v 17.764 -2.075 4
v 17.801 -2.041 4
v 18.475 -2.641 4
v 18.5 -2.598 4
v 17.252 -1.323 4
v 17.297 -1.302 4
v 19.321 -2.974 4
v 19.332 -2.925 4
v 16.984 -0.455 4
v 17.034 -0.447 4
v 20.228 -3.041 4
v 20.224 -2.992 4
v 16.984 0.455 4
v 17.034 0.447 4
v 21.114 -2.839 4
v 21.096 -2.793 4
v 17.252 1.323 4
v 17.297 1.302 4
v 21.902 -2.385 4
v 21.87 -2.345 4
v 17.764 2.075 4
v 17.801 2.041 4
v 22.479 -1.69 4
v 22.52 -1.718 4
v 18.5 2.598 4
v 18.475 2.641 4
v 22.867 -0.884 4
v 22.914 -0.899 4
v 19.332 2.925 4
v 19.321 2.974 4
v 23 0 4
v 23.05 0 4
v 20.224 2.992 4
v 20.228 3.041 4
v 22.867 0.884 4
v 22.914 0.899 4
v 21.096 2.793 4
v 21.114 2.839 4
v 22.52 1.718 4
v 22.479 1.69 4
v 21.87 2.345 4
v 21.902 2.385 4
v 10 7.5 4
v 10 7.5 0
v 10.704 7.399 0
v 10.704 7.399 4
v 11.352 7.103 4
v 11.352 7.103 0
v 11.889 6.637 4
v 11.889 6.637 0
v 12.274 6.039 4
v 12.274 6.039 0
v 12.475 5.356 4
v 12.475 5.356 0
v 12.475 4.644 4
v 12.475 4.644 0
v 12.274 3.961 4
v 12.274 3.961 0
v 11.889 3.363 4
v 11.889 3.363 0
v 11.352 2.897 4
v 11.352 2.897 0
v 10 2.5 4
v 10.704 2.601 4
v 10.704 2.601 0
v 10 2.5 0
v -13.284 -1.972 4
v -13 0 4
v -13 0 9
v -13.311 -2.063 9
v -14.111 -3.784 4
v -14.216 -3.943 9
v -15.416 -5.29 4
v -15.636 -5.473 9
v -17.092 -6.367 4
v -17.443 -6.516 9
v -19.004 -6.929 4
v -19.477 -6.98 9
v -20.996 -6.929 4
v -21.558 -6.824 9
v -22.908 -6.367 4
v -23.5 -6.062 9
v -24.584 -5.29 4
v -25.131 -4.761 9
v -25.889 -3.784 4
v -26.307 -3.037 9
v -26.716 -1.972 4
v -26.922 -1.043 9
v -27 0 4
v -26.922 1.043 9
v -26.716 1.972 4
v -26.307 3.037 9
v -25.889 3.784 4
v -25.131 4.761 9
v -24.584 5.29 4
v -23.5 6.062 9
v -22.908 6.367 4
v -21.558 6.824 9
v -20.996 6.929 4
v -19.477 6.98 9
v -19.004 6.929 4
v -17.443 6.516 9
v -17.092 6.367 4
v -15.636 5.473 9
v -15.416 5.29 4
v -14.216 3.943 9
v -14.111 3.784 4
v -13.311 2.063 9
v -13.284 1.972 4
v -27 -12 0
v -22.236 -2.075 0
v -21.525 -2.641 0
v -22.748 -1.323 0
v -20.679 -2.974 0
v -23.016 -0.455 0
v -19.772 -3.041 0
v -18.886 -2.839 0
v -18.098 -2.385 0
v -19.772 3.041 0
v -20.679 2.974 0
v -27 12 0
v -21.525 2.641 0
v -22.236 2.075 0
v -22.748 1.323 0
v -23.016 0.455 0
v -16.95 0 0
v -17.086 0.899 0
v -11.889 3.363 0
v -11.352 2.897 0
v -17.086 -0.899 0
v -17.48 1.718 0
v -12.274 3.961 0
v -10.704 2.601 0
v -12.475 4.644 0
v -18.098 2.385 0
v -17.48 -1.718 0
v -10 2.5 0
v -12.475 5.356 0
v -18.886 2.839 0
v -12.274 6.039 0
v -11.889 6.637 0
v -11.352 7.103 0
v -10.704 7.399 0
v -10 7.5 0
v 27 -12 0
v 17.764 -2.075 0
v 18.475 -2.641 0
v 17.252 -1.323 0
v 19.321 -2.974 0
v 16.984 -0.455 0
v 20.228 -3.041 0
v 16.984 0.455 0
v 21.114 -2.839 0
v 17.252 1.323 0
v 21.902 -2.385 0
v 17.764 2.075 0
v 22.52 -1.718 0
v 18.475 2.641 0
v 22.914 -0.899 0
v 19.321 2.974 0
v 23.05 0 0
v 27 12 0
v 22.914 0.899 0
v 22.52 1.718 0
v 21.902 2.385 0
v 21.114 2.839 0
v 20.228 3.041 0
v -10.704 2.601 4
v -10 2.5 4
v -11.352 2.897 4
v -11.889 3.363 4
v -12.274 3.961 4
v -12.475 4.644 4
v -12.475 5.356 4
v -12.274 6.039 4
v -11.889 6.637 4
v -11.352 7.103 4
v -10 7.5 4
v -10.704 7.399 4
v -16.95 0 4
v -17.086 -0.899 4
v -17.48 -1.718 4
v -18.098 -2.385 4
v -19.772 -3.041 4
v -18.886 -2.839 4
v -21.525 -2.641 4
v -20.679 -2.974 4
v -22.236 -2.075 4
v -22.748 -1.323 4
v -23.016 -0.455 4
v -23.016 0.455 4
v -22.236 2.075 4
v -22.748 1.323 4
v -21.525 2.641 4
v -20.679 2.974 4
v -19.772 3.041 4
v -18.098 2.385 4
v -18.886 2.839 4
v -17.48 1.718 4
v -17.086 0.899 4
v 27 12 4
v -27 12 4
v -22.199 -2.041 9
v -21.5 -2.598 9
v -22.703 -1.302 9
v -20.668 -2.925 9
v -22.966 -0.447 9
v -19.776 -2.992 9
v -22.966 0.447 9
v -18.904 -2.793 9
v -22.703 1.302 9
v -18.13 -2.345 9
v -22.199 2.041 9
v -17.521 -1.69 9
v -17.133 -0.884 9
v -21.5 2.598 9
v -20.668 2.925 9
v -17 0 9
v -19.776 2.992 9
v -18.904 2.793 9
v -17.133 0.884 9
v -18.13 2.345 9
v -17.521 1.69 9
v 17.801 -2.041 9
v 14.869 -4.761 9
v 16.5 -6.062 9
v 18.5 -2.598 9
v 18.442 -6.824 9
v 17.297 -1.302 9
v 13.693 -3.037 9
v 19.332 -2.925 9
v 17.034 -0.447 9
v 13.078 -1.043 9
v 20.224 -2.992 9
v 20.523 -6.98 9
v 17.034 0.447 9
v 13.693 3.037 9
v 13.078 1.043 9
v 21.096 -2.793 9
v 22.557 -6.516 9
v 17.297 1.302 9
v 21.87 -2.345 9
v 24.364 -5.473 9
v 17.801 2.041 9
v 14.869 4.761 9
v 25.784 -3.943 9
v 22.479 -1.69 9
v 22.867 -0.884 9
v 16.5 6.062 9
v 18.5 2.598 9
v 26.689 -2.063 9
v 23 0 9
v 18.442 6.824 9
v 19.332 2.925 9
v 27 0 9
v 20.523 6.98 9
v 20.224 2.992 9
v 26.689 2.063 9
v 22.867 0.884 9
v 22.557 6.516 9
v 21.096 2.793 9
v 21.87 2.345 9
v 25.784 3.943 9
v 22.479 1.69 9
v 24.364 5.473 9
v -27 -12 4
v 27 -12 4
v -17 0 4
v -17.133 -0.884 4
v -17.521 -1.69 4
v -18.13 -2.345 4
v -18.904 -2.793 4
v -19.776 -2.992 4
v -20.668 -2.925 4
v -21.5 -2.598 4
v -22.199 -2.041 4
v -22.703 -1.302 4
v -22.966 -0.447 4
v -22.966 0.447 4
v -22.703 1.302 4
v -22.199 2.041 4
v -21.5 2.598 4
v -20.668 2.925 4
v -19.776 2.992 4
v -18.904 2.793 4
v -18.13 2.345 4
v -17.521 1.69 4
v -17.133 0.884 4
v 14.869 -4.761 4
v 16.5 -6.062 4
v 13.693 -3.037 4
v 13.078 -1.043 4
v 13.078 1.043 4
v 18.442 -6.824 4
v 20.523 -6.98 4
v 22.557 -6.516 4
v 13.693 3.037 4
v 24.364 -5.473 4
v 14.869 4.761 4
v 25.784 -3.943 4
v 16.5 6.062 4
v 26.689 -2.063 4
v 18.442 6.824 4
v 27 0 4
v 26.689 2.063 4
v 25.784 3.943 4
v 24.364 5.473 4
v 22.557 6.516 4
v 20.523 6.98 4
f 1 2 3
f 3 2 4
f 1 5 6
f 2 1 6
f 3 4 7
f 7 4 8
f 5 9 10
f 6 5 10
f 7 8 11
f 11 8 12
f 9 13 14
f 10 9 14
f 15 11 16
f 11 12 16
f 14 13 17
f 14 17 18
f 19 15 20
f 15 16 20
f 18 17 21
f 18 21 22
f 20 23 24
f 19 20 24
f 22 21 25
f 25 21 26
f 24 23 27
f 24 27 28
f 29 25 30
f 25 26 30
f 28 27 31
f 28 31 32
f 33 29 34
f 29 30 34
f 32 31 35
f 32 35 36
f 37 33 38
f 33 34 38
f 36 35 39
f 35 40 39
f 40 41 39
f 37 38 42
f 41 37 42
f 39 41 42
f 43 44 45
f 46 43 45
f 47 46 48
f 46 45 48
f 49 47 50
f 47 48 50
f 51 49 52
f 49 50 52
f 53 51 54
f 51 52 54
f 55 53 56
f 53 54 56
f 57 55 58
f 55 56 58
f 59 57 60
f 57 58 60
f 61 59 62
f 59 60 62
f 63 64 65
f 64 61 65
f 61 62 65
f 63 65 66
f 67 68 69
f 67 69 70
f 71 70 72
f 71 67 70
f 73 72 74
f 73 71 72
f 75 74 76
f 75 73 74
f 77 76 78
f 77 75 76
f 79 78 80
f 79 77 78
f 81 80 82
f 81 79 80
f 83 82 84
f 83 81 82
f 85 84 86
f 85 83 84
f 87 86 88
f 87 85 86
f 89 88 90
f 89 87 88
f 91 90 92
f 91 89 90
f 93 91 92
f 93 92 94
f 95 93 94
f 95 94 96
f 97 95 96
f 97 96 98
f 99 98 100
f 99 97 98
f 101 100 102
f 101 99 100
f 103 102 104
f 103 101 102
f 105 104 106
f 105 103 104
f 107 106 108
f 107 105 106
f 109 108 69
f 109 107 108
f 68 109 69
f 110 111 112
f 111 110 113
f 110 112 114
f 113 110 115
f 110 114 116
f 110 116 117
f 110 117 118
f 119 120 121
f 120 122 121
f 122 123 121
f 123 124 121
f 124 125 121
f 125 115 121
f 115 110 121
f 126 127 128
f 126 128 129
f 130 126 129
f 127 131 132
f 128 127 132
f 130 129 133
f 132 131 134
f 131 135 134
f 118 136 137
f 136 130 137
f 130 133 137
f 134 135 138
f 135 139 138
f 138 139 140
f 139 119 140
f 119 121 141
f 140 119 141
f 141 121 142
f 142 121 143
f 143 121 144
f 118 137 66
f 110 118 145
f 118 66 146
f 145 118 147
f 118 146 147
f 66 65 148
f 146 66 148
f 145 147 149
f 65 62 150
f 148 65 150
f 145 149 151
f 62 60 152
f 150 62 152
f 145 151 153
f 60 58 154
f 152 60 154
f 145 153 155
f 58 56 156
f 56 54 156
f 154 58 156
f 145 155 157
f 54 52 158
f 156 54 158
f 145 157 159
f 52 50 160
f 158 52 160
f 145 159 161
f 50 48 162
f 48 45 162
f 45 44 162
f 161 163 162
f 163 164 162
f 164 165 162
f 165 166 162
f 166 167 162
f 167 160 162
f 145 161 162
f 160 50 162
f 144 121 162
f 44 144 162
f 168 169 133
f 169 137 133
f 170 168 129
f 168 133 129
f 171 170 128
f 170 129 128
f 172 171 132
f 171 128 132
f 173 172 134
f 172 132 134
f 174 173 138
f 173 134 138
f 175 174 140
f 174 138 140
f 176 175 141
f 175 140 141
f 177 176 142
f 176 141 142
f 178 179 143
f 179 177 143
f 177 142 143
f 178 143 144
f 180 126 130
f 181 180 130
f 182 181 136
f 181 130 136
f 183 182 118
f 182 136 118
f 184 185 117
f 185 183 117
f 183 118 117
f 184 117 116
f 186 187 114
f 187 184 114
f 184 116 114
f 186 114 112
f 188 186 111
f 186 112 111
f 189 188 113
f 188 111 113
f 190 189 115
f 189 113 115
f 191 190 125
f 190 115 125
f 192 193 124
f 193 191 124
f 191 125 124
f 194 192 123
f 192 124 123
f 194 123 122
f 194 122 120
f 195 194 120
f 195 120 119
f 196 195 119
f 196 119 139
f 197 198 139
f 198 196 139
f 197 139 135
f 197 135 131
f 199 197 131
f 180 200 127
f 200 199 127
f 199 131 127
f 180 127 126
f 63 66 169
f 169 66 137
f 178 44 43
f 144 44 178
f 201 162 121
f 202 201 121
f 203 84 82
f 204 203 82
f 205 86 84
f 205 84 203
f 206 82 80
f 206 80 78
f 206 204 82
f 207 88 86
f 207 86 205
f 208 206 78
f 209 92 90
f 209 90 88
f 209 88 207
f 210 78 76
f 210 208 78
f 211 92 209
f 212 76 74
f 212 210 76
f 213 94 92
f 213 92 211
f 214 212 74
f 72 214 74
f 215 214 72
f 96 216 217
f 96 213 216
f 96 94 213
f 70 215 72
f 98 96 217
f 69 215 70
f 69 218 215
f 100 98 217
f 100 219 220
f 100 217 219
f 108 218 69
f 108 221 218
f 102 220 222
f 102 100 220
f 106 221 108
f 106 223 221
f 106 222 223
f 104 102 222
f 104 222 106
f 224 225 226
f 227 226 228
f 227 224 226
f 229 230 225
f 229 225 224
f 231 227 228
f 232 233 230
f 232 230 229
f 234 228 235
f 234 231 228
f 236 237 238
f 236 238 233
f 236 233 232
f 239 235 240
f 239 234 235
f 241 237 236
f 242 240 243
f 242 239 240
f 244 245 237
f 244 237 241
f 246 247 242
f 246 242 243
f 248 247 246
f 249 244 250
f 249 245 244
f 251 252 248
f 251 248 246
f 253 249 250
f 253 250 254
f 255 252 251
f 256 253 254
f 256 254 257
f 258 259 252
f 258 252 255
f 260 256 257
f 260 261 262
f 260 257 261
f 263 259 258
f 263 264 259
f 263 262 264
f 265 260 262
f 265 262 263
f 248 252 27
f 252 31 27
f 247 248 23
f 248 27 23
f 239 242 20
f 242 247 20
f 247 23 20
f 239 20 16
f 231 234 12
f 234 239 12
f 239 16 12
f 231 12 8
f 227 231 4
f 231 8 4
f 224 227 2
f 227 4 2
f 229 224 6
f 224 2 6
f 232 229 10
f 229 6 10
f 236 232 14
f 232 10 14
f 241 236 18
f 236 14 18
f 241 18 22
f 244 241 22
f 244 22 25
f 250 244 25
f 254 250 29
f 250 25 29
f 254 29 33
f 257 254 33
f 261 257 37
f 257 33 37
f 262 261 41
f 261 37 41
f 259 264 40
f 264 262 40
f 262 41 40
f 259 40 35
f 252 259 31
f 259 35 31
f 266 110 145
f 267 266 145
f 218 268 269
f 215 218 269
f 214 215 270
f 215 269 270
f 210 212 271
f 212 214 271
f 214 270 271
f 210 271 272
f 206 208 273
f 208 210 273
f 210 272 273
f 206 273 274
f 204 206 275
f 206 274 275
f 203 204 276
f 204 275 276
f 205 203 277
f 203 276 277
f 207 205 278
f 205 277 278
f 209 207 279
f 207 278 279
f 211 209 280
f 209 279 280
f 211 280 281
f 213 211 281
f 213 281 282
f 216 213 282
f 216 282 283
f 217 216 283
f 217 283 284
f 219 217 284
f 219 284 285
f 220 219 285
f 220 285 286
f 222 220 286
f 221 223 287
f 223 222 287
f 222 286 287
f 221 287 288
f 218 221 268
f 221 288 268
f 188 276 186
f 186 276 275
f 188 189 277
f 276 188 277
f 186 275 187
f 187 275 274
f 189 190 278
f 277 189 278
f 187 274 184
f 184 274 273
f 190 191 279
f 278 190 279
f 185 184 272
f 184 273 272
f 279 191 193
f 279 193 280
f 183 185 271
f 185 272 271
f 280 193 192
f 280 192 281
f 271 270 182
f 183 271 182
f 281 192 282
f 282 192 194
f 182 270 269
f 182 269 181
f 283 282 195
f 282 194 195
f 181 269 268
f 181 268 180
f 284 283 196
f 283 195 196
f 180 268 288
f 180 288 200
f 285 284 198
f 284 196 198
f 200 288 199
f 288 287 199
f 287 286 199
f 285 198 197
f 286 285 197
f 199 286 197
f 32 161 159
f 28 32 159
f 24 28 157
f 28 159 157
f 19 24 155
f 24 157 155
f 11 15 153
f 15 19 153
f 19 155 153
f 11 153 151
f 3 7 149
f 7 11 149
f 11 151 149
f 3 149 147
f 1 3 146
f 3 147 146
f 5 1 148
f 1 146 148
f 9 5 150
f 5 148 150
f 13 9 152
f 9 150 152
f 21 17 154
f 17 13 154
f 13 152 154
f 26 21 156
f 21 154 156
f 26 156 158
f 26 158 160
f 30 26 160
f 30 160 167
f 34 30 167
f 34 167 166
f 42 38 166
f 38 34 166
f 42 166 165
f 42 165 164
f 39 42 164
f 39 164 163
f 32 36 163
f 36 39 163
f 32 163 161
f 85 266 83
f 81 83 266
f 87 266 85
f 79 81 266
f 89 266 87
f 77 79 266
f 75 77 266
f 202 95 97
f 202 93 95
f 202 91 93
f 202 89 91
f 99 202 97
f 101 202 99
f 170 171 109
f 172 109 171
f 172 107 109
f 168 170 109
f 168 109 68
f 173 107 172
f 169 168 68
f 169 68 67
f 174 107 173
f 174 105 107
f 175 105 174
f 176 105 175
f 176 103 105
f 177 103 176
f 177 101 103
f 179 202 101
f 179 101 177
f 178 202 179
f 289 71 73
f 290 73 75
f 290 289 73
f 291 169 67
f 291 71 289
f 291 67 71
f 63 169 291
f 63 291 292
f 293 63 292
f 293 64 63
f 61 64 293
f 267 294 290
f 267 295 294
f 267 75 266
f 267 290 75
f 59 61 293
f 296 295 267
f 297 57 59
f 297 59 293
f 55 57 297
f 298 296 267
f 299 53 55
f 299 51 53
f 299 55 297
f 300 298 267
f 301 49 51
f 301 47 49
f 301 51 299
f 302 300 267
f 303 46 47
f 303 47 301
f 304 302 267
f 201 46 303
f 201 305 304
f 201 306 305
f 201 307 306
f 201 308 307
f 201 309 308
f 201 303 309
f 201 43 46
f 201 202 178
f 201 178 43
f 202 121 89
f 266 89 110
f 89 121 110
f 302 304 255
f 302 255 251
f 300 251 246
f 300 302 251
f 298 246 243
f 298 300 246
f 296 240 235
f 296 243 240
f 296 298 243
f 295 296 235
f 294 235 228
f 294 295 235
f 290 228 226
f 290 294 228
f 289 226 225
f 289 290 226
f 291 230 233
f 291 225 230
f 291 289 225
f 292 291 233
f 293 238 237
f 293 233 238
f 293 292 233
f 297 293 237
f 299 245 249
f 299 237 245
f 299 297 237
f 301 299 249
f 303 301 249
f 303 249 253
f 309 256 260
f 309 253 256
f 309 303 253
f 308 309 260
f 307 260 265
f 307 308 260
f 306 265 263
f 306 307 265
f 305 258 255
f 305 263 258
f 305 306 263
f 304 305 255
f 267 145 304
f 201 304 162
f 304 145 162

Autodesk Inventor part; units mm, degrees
ref_plane "YZ Plane" through (0, 0, 0) normal (1, 0, 0) x (0, 1, 0)
ref_plane "XZ Plane" through (0, 0, 0) normal (0, 1, 0) x (-1, 0, 0)
sketch "Skizze1" plane through (0, 0, 0) normal (0, 0, 1) x (1, 0, 0)
  line L0 (-27, -12) -> (27, -12)
  line L1 (27, -12) -> (27, 12)
  line L2 (27, 12) -> (-27, 12)
  line L3 (-27, 12) -> (-27, -12)
  circle A0 centre (-20, 0) radius 3.05
  circle A1 centre (20, 0) radius 3.05
  arc A2 (-10, 7.5) -> (-10, 2.5) centre (-10, 5) ccw
  arc A3 (10, 2.5) -> (10, 7.5) centre (10, 5) ccw
  line L4 (10, 2.5) -> (-10, 2.5)
  line L5 (10, 7.5) -> (-10, 7.5)
  point P0 (0, 0)
  dimension "d0" = 54
  dimension "d1" = 24
  dimension "d3" = 27
  dimension "d4" = 6.1
  dimension "d5" = 20
  dimension "d6" = 12
  dimension "d7" = 20
  dimension "d8" = 6.1
  dimension "d9" = 12
  dimension "d26" = 4.5
  dimension "d27" = 14.5
  dimension "d28" = 2.5
  dimension "d29" = 20
  dimension "d30" = 10
  dimension "d31" = 12
ref_plane "Arbeitsebene1" through (0, 0, 4) normal (0, 0, 1) x (1, 0, 0)
sketch "Skizze2" plane through (0, 0, 4) normal (0, 0, 1) x (1, 0, 0)
  circle A0 centre (-20, 0) radius 3 projected
  circle A1 centre (20, 0) radius 3 projected
  circle A2 centre (-20, 0) radius 7
  circle A3 centre (-20, 0) radius 3.05
  circle A4 centre (20, 0) radius 3.05
  circle A5 centre (20, 0) radius 7
  point P0 (0, 0)
  dimension "d12" = 6.1
  dimension "d13" = 14
  dimension "d14" = 6.1
  dimension "d15" = 14
extrude "Extrusion2" add sketch "Skizze2" along normal blind 5 contours A2 | A3 | A4 | A5
extrude "Extrusion3" add sketch "Skizze1" along normal blind 4
properties part number "B Montageplatte"
